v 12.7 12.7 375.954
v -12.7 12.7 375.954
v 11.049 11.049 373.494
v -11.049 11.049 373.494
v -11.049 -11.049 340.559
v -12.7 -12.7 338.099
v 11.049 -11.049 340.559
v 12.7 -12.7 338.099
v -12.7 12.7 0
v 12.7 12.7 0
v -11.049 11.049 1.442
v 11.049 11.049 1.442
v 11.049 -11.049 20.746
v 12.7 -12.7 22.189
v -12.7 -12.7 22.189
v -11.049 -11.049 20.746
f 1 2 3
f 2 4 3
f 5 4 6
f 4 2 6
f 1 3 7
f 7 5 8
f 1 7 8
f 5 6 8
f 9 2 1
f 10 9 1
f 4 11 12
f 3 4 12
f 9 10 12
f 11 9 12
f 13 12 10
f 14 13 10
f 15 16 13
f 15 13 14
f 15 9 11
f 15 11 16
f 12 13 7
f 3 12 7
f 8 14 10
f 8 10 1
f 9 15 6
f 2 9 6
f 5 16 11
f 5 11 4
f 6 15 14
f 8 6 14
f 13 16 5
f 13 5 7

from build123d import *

# Parameters (mm, degrees)
SKETCH1_W           = 25.4
SKETCH1_H           = 25.4
SKETCH1_W_2         = 22.098
SKETCH1_H_2         = 22.098
BOSS_EXTRUDE1_DEPTH = 378.309163
CUT_EXTRUDE2_DEPTH  = 26.4
SKETCH5_W           = 25.4
SKETCH5_H           = 25.4
CUT_EXTRUDE3_DEPTH  = 244.121498097


with BuildPart() as part:
    # Sketch1 → Boss-Extrude1 (new body)
    with BuildSketch(Plane.XY):
        Rectangle(SKETCH1_W, SKETCH1_H)
        Rectangle(SKETCH1_W_2, SKETCH1_H_2, mode=Mode.SUBTRACT)
    extrude(amount=BOSS_EXTRUDE1_DEPTH)

    # Sketch4 → Cut-Extrude2 (cut, through all)
    with BuildSketch(Plane.ZY.offset(12.7)):
        Polygon((0, 12.7), (22.23162961, -12.749147595), (0, -16.391086304), align=None)
    extrude(amount=-CUT_EXTRUDE2_DEPTH, mode=Mode.SUBTRACT)

    # Sketch5 → Cut-Extrude3 (cut, through all)
    with BuildSketch(Plane(origin=(0, -132.21706056, 182.766862758), x_dir=(1, 0, 0), z_dir=(0, 0.557172611, 0.830396701))):
        Rectangle(SKETCH5_W, SKETCH5_H)
    extrude(amount=CUT_EXTRUDE3_DEPTH, mode=Mode.SUBTRACT)


solid = part.part
